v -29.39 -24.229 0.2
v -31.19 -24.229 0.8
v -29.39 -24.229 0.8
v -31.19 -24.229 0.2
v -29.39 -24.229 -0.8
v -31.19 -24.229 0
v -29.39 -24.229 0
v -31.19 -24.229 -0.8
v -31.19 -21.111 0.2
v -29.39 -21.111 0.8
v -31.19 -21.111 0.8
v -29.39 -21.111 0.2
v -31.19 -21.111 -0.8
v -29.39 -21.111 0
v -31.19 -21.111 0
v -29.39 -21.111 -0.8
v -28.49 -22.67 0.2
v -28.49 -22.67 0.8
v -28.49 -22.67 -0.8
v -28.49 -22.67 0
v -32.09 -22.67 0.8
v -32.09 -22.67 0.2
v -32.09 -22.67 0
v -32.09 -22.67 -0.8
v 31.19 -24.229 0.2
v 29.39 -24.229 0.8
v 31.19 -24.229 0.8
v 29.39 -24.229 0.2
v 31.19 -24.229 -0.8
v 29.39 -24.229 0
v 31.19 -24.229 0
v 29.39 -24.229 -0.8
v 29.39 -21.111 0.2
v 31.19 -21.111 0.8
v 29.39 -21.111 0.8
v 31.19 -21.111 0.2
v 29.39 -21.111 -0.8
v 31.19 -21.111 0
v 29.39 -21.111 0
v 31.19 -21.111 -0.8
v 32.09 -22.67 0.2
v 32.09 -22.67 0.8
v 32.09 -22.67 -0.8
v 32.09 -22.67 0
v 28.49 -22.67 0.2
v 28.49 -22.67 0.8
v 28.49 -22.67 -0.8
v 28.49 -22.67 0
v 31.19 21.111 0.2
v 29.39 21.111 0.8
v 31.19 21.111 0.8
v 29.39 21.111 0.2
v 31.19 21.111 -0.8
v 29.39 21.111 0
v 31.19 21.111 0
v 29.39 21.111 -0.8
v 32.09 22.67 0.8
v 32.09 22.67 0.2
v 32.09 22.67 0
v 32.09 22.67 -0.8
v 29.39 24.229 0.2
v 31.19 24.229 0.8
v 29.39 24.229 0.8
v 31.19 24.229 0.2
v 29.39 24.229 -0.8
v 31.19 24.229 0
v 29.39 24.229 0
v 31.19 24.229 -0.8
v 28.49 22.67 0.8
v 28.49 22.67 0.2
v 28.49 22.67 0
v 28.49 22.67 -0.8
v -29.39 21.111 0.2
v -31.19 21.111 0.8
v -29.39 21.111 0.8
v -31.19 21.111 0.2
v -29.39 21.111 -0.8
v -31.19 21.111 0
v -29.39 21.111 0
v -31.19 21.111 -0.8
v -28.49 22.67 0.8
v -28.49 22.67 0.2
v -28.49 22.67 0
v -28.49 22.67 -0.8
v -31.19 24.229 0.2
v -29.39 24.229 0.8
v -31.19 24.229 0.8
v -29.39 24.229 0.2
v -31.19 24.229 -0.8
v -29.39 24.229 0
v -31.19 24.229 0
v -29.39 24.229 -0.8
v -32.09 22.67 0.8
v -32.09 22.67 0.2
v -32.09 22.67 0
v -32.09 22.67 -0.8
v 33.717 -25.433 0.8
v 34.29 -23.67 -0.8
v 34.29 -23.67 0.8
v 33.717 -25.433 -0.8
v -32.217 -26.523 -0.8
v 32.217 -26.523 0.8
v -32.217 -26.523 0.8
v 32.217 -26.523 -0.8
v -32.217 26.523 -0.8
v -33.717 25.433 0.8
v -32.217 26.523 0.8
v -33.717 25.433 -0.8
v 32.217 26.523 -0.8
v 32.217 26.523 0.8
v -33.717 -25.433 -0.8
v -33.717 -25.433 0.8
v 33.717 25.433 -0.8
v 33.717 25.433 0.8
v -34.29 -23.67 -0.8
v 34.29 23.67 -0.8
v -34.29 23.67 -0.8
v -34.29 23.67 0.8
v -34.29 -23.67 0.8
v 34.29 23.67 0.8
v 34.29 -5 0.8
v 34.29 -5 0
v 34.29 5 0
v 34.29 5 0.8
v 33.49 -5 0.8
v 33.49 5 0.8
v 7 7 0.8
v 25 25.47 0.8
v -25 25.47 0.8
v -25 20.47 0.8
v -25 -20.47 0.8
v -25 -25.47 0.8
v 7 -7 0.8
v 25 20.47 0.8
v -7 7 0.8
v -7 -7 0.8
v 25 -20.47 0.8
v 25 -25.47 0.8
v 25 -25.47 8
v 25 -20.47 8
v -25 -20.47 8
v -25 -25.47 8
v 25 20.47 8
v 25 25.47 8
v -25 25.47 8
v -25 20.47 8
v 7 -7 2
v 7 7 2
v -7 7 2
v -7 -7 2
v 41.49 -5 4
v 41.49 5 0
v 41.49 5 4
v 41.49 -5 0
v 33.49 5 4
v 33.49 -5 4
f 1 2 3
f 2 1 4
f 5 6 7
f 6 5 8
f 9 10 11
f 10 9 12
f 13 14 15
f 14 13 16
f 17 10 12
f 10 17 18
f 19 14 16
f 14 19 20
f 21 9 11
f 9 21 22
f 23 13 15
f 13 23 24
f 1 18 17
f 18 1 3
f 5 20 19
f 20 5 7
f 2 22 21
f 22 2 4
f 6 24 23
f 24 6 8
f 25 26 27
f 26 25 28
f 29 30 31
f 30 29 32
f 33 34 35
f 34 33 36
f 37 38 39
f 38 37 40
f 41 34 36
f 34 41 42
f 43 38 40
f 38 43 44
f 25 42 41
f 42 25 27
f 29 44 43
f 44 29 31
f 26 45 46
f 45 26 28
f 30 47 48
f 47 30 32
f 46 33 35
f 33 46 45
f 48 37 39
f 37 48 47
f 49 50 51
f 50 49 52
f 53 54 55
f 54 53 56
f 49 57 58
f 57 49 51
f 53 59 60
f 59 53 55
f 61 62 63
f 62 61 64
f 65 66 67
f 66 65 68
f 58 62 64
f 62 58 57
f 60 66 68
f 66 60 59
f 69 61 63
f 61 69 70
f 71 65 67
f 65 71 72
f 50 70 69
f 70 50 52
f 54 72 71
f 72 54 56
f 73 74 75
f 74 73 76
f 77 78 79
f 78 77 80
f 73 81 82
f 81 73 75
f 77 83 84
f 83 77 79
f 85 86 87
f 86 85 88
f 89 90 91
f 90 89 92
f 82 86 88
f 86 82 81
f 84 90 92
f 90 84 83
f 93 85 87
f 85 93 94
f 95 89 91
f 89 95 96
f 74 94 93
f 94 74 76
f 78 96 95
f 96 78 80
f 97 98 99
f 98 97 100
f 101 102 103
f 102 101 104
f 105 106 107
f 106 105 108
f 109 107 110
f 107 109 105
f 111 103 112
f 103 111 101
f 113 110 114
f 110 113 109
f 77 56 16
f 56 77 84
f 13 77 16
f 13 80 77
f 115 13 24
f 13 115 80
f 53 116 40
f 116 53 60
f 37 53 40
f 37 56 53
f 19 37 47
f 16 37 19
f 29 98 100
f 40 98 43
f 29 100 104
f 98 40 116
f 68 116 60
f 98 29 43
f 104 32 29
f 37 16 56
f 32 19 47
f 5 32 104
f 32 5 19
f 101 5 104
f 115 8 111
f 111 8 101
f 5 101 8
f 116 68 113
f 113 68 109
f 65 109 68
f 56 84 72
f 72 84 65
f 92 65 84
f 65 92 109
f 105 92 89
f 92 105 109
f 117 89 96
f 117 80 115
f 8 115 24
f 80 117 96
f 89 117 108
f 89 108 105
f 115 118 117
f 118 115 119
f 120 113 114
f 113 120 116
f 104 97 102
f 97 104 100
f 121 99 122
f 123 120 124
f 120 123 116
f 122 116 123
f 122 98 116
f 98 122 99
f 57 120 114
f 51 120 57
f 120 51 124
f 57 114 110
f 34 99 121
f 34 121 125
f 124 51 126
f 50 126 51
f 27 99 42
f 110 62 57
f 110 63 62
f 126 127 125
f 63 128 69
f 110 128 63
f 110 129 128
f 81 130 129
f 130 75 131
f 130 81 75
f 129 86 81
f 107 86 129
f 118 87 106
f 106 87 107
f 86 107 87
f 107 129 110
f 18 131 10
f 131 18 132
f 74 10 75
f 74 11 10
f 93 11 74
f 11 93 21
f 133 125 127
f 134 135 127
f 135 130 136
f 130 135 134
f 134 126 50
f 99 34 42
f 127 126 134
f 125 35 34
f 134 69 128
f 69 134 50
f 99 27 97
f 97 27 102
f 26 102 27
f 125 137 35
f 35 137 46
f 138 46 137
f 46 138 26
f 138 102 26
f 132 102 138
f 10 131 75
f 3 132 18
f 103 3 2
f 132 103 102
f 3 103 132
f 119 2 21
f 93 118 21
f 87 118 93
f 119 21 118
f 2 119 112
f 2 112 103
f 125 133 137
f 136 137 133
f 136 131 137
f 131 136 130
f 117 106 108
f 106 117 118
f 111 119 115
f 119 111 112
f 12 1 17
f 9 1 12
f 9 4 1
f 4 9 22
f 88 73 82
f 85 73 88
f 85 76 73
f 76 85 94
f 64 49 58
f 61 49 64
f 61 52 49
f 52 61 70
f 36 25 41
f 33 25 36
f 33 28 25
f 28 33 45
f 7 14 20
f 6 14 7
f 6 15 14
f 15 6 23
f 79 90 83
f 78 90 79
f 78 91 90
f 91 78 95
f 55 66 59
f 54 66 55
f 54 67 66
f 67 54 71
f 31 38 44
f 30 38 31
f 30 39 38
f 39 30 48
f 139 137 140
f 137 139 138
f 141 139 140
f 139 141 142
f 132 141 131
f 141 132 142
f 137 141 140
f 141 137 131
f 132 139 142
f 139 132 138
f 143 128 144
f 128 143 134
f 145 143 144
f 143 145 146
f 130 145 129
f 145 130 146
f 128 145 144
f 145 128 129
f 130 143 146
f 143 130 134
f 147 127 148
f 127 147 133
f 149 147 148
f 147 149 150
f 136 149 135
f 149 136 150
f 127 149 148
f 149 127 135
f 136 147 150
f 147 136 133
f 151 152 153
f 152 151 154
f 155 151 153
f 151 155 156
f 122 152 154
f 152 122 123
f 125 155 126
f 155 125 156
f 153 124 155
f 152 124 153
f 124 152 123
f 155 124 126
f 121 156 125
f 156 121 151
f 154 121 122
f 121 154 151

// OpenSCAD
// Parameters
pcb_L = 68.58; //[34.29:137.16:0.01]
pcb_W = 53.34; //[26.67:106.68:0.01]
pcb_T = 1.6; //[0.8:3.2:0.1]
corner_R = 3.0; //[1.5:6.0:0.1]
hole_d = 3.2; //[2.0:4.0:0.1]
hole_edge_offset = 4.0; //[2.0:8.0:0.1]
hole_clearance = 0.2; //[0.0:0.6:0.05]
overlap = 0.8; //[0.5:2.0:0.1]
silk_T = 0.2; //[0.1:0.6:0.05]
silk_margin = 2.0; //[1.0:5.0:0.1]
header_L = 50.0; //[25.0:100.0:0.5]
header_W = 5.0; //[3.0:10.0:0.1]
header_H = 8.0; //[4.0:16.0:0.5]
header_inset = 2.0; //[0.5:6.0:0.1]
ic_L = 14.0; //[7.0:28.0:0.5]
ic_W = 14.0; //[7.0:28.0:0.5]
ic_H = 2.0; //[1.0:6.0:0.1]
usb_L = 8.0; //[4.0:16.0:0.5]
usb_W = 10.0; //[6.0:20.0:0.5]
usb_H = 4.0; //[2.0:10.0:0.5]

// Base shapes
module edge_rounding_corner_cyl() {
  cylinder(r=corner_R, h=pcb_T, center=true);
}

module mounting_hole() {
  cylinder(r=hole_d/2 + hole_clearance, h=pcb_T + 2*overlap, center=true);
}

module silkscreen_markings() {
  cube([pcb_L - 2*silk_margin, pcb_W - 2*silk_margin, silk_T], center=true);
}

module connectors_headers() {
  cube([header_L, header_W, header_H], center=true);
}

module ic_packages_main() {
  cube([ic_L, ic_W, ic_H], center=true);
}

module usb_port() {
  cube([usb_L, usb_W, usb_H], center=true);
}

// Operations
module edge_rounding() {
  hull() {
    translate([pcb_L/2 - corner_R, pcb_W/2 - corner_R, 0]) edge_rounding_corner_cyl();
    translate([-(pcb_L/2 - corner_R), pcb_W/2 - corner_R, 0]) edge_rounding_corner_cyl();
    translate([-(pcb_L/2 - corner_R), -(pcb_W/2 - corner_R), 0]) edge_rounding_corner_cyl();
    translate([pcb_L/2 - corner_R, -(pcb_W/2 - corner_R), 0]) edge_rounding_corner_cyl();
  }
}

module mounting_holes() {
  union() {
    translate([-(pcb_L/2 - hole_edge_offset), -(pcb_W/2 - hole_edge_offset), 0]) mounting_hole();
    translate([pcb_L/2 - hole_edge_offset, -(pcb_W/2 - hole_edge_offset), 0]) mounting_hole();
    translate([pcb_L/2 - hole_edge_offset, pcb_W/2 - hole_edge_offset, 0]) mounting_hole();
    translate([-(pcb_L/2 - hole_edge_offset), pcb_W/2 - hole_edge_offset, 0]) mounting_hole();
  }
}

module pcb_main_body() {
  difference() {
    edge_rounding();
    mounting_holes();
  }
}

module complete_model() {
  union() {
    pcb_main_body();
    translate([0, 0, pcb_T/2 + silk_T/2 - overlap]) silkscreen_markings();
    translate([0, -(pcb_W/2 - header_inset) + header_W/2 - overlap, pcb_T/2 + header_H/2 - overlap]) connectors_headers();
    translate([0, pcb_W/2 - header_inset - header_W/2 + overlap, pcb_T/2 + header_H/2 - overlap]) connectors_headers();
    translate([0, 0, pcb_T/2 + ic_H/2 - overlap]) ic_packages_main();
    translate([pcb_L/2 + usb_L/2 - overlap, 0, pcb_T/2 + usb_H/2 - overlap]) usb_port();
  }
}

// Final output
color([0.0, 0.4, 0.2]) complete_model(); // PCB color
